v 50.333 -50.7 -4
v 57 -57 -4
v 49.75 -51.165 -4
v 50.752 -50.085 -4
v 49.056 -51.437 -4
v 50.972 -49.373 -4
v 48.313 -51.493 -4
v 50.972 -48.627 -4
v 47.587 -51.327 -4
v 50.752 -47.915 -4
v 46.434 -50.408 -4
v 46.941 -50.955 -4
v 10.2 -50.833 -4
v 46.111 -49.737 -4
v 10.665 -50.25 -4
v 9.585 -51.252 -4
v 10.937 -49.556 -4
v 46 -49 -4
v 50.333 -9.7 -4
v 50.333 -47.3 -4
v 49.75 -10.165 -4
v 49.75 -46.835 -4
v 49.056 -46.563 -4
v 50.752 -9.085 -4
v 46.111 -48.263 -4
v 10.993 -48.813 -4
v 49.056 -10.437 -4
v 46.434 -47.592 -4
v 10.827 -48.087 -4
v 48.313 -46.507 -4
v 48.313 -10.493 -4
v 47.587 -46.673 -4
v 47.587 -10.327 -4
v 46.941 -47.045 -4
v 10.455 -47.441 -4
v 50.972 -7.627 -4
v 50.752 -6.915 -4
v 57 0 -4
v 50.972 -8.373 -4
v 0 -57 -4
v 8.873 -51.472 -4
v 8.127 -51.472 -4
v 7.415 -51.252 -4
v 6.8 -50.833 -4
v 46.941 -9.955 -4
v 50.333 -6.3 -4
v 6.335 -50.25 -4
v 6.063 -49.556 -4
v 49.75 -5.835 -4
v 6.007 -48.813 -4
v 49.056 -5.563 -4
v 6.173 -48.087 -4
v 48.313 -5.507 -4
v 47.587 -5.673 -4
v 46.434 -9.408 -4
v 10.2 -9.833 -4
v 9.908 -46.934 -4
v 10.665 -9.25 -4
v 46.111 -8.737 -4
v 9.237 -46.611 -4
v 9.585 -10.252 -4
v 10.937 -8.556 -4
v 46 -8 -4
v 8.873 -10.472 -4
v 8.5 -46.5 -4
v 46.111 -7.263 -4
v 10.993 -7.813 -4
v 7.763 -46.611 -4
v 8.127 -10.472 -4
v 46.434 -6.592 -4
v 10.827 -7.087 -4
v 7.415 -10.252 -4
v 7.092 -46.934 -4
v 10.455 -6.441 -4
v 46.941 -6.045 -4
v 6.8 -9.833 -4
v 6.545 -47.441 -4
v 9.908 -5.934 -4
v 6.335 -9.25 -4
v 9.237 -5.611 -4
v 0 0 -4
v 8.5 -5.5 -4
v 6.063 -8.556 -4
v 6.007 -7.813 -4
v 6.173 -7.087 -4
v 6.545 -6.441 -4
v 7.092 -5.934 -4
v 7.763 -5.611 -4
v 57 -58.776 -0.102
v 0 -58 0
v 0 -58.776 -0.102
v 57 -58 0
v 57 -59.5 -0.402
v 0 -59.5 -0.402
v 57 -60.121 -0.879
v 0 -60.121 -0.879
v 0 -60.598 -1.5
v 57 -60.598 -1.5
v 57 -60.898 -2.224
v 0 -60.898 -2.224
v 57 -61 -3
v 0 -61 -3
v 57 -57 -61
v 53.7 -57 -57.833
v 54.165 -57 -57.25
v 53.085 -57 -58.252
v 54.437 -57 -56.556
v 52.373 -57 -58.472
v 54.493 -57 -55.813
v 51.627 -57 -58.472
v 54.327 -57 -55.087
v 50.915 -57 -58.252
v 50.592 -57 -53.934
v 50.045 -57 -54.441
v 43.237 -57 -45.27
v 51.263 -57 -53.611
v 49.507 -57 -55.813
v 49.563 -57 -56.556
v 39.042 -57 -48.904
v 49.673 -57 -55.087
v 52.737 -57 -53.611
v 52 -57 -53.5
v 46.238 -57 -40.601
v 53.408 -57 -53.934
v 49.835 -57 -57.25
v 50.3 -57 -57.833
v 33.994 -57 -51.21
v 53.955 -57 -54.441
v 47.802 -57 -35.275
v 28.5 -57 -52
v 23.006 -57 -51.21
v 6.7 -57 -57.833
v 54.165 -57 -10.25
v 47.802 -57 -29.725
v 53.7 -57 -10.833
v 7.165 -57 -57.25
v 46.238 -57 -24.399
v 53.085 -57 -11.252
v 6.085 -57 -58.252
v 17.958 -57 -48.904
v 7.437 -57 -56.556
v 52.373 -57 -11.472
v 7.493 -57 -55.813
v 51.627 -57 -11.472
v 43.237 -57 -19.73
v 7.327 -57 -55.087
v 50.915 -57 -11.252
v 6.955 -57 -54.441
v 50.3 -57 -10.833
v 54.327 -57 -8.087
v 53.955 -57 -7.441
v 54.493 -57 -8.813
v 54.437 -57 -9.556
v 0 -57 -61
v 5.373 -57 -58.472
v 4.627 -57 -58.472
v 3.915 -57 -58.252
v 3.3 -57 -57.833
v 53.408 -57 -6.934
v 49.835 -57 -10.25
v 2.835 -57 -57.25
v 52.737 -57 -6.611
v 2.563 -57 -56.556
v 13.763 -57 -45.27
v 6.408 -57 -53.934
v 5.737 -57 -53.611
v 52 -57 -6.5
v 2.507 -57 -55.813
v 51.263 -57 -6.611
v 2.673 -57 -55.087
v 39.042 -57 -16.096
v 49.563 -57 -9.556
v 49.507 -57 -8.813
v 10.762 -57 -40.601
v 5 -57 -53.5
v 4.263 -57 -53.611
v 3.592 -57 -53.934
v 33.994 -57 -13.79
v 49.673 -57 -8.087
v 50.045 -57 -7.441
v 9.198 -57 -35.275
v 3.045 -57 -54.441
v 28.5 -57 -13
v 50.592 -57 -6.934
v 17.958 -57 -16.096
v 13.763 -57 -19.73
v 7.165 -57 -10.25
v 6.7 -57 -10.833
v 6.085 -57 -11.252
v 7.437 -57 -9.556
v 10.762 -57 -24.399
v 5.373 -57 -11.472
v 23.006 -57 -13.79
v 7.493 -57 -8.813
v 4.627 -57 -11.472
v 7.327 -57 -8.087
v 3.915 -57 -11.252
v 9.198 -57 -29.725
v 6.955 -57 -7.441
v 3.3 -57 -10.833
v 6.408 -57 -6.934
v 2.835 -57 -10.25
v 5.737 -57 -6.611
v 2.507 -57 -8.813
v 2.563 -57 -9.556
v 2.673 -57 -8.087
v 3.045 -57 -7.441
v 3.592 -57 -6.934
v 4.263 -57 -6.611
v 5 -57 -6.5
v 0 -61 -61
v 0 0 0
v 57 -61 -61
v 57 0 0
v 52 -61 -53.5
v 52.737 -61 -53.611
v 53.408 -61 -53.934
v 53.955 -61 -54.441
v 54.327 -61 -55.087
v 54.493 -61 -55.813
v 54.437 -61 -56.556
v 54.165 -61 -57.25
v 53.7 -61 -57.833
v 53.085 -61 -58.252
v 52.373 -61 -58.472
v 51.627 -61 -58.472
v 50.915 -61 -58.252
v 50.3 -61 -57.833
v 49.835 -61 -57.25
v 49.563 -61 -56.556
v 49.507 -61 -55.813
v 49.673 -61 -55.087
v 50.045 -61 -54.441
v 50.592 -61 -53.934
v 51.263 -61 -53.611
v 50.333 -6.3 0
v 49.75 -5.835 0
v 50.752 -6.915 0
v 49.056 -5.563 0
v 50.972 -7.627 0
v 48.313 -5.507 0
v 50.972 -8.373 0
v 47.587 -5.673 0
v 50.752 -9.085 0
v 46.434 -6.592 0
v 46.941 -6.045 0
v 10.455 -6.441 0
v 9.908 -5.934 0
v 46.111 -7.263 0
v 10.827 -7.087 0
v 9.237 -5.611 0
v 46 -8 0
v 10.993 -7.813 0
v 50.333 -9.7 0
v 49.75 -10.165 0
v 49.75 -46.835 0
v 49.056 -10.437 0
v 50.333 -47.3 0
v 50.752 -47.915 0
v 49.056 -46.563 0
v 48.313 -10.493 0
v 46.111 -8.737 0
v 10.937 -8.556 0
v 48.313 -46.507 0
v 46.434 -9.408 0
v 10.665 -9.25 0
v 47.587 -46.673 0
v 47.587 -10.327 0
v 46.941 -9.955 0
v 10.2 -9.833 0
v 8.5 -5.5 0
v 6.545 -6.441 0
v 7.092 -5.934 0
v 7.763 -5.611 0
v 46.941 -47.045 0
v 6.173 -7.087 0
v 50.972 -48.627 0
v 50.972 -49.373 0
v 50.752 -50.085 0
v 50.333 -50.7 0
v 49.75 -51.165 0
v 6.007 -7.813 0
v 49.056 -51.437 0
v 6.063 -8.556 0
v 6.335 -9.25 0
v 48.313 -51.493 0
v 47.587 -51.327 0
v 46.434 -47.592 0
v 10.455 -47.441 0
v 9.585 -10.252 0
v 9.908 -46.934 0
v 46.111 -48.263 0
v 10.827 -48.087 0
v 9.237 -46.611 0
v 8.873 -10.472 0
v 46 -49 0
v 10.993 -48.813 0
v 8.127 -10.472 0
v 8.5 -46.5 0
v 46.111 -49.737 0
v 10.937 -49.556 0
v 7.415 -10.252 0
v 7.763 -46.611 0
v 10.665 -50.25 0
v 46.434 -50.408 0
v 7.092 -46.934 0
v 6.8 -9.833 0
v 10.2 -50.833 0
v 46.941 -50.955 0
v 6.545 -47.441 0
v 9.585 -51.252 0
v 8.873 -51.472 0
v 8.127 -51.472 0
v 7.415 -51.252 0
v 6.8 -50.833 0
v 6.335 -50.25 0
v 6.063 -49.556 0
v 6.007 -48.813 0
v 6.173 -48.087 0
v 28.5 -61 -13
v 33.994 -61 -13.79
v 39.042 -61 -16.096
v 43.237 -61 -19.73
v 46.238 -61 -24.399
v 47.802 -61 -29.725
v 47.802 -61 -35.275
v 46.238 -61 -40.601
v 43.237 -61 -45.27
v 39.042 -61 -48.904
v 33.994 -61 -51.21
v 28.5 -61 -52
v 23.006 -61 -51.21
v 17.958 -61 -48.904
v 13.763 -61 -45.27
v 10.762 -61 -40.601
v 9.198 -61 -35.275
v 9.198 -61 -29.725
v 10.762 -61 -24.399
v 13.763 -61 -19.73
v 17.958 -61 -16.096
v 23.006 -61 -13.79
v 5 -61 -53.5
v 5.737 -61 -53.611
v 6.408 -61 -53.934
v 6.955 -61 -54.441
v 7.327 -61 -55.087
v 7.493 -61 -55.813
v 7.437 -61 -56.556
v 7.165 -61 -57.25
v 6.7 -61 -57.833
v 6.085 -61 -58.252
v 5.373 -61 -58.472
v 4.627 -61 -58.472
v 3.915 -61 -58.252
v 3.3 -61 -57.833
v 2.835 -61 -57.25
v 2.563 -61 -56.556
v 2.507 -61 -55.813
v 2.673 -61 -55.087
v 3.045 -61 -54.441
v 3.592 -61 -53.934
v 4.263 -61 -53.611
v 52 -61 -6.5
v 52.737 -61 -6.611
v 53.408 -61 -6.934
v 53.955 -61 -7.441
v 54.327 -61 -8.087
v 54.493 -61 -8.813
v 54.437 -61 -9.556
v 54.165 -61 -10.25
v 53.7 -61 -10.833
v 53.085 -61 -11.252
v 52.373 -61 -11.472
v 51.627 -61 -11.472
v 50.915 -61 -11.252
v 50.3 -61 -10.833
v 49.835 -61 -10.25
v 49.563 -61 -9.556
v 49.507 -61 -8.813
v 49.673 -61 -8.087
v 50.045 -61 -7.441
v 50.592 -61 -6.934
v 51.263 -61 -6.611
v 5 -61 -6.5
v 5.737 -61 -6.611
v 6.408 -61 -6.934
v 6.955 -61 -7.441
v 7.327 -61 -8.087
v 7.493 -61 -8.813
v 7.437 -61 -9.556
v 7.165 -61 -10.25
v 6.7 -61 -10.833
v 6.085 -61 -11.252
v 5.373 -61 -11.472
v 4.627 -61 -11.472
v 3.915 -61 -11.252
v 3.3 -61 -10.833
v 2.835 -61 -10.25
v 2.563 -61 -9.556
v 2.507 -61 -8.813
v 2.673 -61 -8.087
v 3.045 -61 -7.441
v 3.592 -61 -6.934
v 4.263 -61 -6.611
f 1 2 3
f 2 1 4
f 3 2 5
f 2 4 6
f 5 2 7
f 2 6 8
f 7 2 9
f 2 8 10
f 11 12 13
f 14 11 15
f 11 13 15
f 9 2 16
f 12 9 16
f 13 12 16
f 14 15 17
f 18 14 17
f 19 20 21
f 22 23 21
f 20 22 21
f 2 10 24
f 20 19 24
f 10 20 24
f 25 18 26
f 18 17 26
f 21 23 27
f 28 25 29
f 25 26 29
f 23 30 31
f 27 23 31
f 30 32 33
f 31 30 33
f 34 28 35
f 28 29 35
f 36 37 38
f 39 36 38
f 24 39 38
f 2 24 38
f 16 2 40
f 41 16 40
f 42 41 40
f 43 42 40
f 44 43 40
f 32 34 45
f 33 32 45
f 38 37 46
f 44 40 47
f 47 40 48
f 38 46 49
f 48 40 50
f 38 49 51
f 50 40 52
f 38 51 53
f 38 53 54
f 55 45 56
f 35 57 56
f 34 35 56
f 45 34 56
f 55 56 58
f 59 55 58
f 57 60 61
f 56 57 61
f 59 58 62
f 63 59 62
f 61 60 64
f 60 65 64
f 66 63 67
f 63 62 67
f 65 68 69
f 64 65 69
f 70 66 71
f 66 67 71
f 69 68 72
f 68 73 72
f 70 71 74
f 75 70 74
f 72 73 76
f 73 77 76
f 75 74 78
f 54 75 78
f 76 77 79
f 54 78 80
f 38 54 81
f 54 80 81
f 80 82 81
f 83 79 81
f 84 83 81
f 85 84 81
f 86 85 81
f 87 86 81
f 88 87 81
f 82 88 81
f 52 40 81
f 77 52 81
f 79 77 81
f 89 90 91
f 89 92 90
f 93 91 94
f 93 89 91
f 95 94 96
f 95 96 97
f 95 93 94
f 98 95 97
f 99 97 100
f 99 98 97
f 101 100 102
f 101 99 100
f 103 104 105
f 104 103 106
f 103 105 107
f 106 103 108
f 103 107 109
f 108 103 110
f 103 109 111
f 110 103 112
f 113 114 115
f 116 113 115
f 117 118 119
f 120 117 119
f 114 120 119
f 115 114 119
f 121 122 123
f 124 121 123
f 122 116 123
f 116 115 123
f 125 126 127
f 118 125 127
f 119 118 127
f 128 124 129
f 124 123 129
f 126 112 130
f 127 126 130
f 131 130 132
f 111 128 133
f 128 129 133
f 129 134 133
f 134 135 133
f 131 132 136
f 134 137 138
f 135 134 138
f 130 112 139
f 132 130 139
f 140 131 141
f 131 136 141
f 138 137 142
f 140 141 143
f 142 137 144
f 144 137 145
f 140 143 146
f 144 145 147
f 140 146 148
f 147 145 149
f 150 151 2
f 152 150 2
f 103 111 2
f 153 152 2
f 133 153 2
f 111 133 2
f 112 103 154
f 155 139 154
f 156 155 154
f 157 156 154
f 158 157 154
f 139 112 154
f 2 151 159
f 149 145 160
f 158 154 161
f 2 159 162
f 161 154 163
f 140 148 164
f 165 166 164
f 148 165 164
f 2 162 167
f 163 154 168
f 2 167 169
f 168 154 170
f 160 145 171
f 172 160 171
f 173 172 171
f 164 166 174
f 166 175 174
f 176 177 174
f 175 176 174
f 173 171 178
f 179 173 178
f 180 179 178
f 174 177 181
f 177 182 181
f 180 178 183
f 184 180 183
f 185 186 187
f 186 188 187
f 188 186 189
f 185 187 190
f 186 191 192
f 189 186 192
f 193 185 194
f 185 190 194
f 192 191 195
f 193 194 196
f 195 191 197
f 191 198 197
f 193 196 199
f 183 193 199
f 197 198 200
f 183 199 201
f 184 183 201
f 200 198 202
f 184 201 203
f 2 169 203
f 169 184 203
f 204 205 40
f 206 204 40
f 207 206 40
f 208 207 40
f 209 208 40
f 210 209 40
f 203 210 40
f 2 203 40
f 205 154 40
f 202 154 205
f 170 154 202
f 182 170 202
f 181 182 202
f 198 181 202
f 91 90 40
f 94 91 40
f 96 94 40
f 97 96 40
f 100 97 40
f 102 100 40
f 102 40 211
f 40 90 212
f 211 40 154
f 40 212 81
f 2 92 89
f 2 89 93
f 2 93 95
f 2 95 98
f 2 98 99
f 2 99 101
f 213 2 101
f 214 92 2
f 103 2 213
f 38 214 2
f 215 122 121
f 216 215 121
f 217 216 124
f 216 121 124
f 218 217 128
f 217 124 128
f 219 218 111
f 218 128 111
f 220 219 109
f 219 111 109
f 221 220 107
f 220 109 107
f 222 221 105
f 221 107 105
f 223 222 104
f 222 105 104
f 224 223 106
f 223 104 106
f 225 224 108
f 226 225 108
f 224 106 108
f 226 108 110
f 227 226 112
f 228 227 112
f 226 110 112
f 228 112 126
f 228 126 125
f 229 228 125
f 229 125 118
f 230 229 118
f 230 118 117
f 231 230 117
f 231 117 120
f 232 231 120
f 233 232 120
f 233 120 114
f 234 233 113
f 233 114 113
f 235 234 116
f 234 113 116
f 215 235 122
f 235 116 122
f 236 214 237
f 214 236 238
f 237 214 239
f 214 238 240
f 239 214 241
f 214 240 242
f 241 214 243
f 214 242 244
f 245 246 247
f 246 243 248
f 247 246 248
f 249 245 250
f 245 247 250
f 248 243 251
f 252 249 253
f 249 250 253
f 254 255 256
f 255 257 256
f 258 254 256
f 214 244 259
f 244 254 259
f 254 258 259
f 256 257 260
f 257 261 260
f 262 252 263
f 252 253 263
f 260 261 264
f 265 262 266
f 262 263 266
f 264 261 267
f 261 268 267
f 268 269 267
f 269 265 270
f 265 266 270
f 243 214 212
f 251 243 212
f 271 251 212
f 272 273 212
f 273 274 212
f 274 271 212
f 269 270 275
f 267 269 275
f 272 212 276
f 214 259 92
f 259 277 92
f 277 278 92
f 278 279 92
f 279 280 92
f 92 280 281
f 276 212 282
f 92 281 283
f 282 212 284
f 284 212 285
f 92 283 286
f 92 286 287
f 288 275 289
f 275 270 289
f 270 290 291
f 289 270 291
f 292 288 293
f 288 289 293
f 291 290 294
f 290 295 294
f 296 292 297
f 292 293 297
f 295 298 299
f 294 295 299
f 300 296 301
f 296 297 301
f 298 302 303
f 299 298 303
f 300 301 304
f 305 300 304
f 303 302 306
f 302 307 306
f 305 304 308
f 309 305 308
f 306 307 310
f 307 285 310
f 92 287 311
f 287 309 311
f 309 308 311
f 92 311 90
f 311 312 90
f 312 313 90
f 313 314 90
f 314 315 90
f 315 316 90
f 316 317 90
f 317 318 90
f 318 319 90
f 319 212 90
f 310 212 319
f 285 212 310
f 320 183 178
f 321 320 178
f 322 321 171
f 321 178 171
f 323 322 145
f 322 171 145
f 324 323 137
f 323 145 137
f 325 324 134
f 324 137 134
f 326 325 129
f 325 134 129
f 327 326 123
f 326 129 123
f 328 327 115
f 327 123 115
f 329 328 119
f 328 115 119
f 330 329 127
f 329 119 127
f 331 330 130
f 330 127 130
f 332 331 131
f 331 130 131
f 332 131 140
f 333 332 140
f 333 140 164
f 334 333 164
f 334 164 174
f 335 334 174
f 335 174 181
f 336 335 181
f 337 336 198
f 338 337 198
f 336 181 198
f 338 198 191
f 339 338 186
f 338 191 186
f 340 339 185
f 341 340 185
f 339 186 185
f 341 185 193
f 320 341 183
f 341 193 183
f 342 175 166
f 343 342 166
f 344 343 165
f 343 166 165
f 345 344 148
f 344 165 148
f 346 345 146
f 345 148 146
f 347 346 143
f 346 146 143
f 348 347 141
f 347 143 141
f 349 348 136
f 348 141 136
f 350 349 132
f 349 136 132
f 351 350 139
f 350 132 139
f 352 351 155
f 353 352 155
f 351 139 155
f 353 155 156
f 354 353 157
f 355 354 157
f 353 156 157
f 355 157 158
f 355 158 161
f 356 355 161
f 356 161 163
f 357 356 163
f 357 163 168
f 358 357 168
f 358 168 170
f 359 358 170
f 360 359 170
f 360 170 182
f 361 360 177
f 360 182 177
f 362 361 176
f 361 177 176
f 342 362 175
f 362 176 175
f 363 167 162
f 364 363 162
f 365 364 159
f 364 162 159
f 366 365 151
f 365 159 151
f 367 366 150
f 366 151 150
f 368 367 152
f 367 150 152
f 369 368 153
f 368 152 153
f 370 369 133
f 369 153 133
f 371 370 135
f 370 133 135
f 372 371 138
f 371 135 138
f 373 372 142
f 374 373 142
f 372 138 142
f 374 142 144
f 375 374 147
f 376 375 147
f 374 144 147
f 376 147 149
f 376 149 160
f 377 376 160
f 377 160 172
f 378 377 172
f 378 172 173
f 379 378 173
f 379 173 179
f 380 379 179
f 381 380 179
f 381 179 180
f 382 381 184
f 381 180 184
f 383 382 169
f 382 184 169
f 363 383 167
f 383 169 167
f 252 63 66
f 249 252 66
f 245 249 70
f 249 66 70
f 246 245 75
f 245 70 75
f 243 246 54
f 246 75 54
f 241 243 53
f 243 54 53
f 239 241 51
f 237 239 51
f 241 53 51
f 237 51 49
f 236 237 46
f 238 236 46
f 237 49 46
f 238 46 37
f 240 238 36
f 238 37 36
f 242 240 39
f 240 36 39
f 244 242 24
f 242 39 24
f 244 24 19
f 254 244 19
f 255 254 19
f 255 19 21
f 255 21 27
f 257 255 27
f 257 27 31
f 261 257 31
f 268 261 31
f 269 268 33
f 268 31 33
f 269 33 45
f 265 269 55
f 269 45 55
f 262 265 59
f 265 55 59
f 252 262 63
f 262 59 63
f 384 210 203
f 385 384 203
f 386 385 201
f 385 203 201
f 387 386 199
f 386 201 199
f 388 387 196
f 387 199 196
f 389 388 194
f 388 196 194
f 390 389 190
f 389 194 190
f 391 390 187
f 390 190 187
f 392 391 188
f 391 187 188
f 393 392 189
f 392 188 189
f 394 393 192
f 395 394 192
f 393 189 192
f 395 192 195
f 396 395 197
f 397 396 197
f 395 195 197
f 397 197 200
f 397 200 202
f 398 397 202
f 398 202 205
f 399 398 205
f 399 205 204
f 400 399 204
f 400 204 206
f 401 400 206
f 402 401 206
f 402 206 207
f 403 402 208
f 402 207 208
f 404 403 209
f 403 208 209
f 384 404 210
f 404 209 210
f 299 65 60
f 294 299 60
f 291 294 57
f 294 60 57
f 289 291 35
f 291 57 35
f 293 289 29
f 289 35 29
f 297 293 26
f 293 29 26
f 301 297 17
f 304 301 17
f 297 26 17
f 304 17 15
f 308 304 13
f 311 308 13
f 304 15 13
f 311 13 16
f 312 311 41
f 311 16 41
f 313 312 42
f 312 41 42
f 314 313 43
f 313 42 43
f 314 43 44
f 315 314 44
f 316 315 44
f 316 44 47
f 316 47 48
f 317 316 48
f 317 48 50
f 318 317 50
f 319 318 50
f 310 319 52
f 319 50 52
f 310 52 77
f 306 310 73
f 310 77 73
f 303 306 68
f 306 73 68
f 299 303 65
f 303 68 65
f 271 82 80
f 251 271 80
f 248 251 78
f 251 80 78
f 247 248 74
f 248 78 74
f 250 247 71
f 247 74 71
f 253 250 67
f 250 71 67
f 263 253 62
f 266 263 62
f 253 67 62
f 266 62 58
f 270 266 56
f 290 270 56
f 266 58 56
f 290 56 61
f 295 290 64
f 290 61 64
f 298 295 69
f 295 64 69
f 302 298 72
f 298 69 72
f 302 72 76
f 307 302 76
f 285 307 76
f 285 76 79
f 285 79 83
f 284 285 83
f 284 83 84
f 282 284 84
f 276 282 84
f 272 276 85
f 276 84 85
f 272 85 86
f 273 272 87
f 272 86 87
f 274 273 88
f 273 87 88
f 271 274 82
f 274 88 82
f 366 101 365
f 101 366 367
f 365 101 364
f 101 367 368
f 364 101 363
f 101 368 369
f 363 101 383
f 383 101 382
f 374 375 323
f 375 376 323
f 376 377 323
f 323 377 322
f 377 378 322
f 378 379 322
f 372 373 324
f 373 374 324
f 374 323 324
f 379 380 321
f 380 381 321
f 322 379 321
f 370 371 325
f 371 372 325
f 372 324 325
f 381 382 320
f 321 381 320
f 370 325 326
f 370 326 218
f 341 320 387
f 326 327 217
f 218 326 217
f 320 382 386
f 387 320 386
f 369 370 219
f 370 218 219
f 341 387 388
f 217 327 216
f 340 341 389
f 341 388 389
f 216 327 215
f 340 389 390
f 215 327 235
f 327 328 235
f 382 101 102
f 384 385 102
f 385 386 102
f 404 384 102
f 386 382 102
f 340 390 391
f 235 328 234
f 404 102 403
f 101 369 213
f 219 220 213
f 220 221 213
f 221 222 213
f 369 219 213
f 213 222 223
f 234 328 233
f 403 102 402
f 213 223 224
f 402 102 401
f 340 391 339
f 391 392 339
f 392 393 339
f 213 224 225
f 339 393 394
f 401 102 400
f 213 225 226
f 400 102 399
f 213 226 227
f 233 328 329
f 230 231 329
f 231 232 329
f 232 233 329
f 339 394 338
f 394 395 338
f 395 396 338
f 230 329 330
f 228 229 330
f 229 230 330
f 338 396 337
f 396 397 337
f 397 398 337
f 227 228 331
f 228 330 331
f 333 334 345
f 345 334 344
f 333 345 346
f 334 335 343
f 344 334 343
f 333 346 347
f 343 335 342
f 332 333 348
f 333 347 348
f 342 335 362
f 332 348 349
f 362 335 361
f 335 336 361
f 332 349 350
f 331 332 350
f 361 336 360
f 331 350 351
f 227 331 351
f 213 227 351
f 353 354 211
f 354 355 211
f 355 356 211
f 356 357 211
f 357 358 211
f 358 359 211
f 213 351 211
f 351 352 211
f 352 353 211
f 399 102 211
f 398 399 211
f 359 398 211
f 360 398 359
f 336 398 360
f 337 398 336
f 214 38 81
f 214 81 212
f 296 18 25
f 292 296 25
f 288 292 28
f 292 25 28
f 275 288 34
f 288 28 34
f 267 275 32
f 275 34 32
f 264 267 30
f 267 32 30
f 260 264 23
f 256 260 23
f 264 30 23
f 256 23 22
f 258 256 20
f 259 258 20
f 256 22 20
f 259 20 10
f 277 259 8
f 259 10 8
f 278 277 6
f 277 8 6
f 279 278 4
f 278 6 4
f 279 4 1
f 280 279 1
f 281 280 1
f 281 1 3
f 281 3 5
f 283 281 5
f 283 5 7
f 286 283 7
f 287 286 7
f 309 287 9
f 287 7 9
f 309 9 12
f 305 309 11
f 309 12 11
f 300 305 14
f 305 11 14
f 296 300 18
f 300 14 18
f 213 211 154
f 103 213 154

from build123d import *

# Parameters (mm, degrees)
BOSS_EXTRUDE4_DEPTH = 57
FILLET4_R           = 3
SKETCH10_R          = 2.5
SKETCH10_R_2        = 19.5
CUT_EXTRUDE5_DEPTH  = 4
SKETCH11_R          = 2.5
CUT_EXTRUDE6_DEPTH  = 4


with BuildPart() as part:
    # Sketch1 → Boss-Extrude4 (new body)
    with BuildSketch(Plane(origin=(0, 0, 0), x_dir=(0, 0, -1), z_dir=(1, 0, 0))):
        Polygon((0, 0), (0, -61), (61, -61), (61, -57), (4, -57), (4, 0), align=None)
    extrude(amount=BOSS_EXTRUDE4_DEPTH)

    # Fillet4
    fillet4_edges = [part.edges().sort_by_distance(p)[0] for p in [
        (28.5, -61, 0),
    ]]
    fillet(fillet4_edges, radius=FILLET4_R)

    # Sketch10 → Cut-Extrude5 (cut)
    with BuildSketch(Plane(origin=(0, -57, 0), x_dir=(1, 0, 0), z_dir=(0, 1, 0))):
        with Locations(Location((5, 56, 0), (0, 0, 270))):
            Circle(SKETCH10_R)
        with Locations(Location((5, 9, 0), (0, 0, 270))):
            Circle(SKETCH10_R)
        with Locations(Location((52, 9, 0), (0, 0, 270))):
            Circle(SKETCH10_R)
        with Locations(Location((52, 56, 0), (0, 0, 270))):
            Circle(SKETCH10_R)
        with Locations(Location((28.5, 32.5, 0), (0, 0, 270))):
            Circle(SKETCH10_R_2)
    extrude(amount=-CUT_EXTRUDE5_DEPTH, mode=Mode.SUBTRACT)

    # Sketch11 → Cut-Extrude6 (cut)
    with BuildSketch(Plane(origin=(0, 0, -4), x_dir=(-1, 0, 0), z_dir=(0, 0, -1))):
        with Locations((-48.5, -8)):
            Circle(SKETCH11_R)
        with Locations((-48.5, -49)):
            Circle(SKETCH11_R)
        with Locations(Location((-8.5, -49, 0), (0, 0, 90))):
            Circle(SKETCH11_R)
        with Locations(Location((-8.5, -8, 0), (0, 0, 90))):
            Circle(SKETCH11_R)
    extrude(amount=-CUT_EXTRUDE6_DEPTH, mode=Mode.SUBTRACT)


solid = part.part
